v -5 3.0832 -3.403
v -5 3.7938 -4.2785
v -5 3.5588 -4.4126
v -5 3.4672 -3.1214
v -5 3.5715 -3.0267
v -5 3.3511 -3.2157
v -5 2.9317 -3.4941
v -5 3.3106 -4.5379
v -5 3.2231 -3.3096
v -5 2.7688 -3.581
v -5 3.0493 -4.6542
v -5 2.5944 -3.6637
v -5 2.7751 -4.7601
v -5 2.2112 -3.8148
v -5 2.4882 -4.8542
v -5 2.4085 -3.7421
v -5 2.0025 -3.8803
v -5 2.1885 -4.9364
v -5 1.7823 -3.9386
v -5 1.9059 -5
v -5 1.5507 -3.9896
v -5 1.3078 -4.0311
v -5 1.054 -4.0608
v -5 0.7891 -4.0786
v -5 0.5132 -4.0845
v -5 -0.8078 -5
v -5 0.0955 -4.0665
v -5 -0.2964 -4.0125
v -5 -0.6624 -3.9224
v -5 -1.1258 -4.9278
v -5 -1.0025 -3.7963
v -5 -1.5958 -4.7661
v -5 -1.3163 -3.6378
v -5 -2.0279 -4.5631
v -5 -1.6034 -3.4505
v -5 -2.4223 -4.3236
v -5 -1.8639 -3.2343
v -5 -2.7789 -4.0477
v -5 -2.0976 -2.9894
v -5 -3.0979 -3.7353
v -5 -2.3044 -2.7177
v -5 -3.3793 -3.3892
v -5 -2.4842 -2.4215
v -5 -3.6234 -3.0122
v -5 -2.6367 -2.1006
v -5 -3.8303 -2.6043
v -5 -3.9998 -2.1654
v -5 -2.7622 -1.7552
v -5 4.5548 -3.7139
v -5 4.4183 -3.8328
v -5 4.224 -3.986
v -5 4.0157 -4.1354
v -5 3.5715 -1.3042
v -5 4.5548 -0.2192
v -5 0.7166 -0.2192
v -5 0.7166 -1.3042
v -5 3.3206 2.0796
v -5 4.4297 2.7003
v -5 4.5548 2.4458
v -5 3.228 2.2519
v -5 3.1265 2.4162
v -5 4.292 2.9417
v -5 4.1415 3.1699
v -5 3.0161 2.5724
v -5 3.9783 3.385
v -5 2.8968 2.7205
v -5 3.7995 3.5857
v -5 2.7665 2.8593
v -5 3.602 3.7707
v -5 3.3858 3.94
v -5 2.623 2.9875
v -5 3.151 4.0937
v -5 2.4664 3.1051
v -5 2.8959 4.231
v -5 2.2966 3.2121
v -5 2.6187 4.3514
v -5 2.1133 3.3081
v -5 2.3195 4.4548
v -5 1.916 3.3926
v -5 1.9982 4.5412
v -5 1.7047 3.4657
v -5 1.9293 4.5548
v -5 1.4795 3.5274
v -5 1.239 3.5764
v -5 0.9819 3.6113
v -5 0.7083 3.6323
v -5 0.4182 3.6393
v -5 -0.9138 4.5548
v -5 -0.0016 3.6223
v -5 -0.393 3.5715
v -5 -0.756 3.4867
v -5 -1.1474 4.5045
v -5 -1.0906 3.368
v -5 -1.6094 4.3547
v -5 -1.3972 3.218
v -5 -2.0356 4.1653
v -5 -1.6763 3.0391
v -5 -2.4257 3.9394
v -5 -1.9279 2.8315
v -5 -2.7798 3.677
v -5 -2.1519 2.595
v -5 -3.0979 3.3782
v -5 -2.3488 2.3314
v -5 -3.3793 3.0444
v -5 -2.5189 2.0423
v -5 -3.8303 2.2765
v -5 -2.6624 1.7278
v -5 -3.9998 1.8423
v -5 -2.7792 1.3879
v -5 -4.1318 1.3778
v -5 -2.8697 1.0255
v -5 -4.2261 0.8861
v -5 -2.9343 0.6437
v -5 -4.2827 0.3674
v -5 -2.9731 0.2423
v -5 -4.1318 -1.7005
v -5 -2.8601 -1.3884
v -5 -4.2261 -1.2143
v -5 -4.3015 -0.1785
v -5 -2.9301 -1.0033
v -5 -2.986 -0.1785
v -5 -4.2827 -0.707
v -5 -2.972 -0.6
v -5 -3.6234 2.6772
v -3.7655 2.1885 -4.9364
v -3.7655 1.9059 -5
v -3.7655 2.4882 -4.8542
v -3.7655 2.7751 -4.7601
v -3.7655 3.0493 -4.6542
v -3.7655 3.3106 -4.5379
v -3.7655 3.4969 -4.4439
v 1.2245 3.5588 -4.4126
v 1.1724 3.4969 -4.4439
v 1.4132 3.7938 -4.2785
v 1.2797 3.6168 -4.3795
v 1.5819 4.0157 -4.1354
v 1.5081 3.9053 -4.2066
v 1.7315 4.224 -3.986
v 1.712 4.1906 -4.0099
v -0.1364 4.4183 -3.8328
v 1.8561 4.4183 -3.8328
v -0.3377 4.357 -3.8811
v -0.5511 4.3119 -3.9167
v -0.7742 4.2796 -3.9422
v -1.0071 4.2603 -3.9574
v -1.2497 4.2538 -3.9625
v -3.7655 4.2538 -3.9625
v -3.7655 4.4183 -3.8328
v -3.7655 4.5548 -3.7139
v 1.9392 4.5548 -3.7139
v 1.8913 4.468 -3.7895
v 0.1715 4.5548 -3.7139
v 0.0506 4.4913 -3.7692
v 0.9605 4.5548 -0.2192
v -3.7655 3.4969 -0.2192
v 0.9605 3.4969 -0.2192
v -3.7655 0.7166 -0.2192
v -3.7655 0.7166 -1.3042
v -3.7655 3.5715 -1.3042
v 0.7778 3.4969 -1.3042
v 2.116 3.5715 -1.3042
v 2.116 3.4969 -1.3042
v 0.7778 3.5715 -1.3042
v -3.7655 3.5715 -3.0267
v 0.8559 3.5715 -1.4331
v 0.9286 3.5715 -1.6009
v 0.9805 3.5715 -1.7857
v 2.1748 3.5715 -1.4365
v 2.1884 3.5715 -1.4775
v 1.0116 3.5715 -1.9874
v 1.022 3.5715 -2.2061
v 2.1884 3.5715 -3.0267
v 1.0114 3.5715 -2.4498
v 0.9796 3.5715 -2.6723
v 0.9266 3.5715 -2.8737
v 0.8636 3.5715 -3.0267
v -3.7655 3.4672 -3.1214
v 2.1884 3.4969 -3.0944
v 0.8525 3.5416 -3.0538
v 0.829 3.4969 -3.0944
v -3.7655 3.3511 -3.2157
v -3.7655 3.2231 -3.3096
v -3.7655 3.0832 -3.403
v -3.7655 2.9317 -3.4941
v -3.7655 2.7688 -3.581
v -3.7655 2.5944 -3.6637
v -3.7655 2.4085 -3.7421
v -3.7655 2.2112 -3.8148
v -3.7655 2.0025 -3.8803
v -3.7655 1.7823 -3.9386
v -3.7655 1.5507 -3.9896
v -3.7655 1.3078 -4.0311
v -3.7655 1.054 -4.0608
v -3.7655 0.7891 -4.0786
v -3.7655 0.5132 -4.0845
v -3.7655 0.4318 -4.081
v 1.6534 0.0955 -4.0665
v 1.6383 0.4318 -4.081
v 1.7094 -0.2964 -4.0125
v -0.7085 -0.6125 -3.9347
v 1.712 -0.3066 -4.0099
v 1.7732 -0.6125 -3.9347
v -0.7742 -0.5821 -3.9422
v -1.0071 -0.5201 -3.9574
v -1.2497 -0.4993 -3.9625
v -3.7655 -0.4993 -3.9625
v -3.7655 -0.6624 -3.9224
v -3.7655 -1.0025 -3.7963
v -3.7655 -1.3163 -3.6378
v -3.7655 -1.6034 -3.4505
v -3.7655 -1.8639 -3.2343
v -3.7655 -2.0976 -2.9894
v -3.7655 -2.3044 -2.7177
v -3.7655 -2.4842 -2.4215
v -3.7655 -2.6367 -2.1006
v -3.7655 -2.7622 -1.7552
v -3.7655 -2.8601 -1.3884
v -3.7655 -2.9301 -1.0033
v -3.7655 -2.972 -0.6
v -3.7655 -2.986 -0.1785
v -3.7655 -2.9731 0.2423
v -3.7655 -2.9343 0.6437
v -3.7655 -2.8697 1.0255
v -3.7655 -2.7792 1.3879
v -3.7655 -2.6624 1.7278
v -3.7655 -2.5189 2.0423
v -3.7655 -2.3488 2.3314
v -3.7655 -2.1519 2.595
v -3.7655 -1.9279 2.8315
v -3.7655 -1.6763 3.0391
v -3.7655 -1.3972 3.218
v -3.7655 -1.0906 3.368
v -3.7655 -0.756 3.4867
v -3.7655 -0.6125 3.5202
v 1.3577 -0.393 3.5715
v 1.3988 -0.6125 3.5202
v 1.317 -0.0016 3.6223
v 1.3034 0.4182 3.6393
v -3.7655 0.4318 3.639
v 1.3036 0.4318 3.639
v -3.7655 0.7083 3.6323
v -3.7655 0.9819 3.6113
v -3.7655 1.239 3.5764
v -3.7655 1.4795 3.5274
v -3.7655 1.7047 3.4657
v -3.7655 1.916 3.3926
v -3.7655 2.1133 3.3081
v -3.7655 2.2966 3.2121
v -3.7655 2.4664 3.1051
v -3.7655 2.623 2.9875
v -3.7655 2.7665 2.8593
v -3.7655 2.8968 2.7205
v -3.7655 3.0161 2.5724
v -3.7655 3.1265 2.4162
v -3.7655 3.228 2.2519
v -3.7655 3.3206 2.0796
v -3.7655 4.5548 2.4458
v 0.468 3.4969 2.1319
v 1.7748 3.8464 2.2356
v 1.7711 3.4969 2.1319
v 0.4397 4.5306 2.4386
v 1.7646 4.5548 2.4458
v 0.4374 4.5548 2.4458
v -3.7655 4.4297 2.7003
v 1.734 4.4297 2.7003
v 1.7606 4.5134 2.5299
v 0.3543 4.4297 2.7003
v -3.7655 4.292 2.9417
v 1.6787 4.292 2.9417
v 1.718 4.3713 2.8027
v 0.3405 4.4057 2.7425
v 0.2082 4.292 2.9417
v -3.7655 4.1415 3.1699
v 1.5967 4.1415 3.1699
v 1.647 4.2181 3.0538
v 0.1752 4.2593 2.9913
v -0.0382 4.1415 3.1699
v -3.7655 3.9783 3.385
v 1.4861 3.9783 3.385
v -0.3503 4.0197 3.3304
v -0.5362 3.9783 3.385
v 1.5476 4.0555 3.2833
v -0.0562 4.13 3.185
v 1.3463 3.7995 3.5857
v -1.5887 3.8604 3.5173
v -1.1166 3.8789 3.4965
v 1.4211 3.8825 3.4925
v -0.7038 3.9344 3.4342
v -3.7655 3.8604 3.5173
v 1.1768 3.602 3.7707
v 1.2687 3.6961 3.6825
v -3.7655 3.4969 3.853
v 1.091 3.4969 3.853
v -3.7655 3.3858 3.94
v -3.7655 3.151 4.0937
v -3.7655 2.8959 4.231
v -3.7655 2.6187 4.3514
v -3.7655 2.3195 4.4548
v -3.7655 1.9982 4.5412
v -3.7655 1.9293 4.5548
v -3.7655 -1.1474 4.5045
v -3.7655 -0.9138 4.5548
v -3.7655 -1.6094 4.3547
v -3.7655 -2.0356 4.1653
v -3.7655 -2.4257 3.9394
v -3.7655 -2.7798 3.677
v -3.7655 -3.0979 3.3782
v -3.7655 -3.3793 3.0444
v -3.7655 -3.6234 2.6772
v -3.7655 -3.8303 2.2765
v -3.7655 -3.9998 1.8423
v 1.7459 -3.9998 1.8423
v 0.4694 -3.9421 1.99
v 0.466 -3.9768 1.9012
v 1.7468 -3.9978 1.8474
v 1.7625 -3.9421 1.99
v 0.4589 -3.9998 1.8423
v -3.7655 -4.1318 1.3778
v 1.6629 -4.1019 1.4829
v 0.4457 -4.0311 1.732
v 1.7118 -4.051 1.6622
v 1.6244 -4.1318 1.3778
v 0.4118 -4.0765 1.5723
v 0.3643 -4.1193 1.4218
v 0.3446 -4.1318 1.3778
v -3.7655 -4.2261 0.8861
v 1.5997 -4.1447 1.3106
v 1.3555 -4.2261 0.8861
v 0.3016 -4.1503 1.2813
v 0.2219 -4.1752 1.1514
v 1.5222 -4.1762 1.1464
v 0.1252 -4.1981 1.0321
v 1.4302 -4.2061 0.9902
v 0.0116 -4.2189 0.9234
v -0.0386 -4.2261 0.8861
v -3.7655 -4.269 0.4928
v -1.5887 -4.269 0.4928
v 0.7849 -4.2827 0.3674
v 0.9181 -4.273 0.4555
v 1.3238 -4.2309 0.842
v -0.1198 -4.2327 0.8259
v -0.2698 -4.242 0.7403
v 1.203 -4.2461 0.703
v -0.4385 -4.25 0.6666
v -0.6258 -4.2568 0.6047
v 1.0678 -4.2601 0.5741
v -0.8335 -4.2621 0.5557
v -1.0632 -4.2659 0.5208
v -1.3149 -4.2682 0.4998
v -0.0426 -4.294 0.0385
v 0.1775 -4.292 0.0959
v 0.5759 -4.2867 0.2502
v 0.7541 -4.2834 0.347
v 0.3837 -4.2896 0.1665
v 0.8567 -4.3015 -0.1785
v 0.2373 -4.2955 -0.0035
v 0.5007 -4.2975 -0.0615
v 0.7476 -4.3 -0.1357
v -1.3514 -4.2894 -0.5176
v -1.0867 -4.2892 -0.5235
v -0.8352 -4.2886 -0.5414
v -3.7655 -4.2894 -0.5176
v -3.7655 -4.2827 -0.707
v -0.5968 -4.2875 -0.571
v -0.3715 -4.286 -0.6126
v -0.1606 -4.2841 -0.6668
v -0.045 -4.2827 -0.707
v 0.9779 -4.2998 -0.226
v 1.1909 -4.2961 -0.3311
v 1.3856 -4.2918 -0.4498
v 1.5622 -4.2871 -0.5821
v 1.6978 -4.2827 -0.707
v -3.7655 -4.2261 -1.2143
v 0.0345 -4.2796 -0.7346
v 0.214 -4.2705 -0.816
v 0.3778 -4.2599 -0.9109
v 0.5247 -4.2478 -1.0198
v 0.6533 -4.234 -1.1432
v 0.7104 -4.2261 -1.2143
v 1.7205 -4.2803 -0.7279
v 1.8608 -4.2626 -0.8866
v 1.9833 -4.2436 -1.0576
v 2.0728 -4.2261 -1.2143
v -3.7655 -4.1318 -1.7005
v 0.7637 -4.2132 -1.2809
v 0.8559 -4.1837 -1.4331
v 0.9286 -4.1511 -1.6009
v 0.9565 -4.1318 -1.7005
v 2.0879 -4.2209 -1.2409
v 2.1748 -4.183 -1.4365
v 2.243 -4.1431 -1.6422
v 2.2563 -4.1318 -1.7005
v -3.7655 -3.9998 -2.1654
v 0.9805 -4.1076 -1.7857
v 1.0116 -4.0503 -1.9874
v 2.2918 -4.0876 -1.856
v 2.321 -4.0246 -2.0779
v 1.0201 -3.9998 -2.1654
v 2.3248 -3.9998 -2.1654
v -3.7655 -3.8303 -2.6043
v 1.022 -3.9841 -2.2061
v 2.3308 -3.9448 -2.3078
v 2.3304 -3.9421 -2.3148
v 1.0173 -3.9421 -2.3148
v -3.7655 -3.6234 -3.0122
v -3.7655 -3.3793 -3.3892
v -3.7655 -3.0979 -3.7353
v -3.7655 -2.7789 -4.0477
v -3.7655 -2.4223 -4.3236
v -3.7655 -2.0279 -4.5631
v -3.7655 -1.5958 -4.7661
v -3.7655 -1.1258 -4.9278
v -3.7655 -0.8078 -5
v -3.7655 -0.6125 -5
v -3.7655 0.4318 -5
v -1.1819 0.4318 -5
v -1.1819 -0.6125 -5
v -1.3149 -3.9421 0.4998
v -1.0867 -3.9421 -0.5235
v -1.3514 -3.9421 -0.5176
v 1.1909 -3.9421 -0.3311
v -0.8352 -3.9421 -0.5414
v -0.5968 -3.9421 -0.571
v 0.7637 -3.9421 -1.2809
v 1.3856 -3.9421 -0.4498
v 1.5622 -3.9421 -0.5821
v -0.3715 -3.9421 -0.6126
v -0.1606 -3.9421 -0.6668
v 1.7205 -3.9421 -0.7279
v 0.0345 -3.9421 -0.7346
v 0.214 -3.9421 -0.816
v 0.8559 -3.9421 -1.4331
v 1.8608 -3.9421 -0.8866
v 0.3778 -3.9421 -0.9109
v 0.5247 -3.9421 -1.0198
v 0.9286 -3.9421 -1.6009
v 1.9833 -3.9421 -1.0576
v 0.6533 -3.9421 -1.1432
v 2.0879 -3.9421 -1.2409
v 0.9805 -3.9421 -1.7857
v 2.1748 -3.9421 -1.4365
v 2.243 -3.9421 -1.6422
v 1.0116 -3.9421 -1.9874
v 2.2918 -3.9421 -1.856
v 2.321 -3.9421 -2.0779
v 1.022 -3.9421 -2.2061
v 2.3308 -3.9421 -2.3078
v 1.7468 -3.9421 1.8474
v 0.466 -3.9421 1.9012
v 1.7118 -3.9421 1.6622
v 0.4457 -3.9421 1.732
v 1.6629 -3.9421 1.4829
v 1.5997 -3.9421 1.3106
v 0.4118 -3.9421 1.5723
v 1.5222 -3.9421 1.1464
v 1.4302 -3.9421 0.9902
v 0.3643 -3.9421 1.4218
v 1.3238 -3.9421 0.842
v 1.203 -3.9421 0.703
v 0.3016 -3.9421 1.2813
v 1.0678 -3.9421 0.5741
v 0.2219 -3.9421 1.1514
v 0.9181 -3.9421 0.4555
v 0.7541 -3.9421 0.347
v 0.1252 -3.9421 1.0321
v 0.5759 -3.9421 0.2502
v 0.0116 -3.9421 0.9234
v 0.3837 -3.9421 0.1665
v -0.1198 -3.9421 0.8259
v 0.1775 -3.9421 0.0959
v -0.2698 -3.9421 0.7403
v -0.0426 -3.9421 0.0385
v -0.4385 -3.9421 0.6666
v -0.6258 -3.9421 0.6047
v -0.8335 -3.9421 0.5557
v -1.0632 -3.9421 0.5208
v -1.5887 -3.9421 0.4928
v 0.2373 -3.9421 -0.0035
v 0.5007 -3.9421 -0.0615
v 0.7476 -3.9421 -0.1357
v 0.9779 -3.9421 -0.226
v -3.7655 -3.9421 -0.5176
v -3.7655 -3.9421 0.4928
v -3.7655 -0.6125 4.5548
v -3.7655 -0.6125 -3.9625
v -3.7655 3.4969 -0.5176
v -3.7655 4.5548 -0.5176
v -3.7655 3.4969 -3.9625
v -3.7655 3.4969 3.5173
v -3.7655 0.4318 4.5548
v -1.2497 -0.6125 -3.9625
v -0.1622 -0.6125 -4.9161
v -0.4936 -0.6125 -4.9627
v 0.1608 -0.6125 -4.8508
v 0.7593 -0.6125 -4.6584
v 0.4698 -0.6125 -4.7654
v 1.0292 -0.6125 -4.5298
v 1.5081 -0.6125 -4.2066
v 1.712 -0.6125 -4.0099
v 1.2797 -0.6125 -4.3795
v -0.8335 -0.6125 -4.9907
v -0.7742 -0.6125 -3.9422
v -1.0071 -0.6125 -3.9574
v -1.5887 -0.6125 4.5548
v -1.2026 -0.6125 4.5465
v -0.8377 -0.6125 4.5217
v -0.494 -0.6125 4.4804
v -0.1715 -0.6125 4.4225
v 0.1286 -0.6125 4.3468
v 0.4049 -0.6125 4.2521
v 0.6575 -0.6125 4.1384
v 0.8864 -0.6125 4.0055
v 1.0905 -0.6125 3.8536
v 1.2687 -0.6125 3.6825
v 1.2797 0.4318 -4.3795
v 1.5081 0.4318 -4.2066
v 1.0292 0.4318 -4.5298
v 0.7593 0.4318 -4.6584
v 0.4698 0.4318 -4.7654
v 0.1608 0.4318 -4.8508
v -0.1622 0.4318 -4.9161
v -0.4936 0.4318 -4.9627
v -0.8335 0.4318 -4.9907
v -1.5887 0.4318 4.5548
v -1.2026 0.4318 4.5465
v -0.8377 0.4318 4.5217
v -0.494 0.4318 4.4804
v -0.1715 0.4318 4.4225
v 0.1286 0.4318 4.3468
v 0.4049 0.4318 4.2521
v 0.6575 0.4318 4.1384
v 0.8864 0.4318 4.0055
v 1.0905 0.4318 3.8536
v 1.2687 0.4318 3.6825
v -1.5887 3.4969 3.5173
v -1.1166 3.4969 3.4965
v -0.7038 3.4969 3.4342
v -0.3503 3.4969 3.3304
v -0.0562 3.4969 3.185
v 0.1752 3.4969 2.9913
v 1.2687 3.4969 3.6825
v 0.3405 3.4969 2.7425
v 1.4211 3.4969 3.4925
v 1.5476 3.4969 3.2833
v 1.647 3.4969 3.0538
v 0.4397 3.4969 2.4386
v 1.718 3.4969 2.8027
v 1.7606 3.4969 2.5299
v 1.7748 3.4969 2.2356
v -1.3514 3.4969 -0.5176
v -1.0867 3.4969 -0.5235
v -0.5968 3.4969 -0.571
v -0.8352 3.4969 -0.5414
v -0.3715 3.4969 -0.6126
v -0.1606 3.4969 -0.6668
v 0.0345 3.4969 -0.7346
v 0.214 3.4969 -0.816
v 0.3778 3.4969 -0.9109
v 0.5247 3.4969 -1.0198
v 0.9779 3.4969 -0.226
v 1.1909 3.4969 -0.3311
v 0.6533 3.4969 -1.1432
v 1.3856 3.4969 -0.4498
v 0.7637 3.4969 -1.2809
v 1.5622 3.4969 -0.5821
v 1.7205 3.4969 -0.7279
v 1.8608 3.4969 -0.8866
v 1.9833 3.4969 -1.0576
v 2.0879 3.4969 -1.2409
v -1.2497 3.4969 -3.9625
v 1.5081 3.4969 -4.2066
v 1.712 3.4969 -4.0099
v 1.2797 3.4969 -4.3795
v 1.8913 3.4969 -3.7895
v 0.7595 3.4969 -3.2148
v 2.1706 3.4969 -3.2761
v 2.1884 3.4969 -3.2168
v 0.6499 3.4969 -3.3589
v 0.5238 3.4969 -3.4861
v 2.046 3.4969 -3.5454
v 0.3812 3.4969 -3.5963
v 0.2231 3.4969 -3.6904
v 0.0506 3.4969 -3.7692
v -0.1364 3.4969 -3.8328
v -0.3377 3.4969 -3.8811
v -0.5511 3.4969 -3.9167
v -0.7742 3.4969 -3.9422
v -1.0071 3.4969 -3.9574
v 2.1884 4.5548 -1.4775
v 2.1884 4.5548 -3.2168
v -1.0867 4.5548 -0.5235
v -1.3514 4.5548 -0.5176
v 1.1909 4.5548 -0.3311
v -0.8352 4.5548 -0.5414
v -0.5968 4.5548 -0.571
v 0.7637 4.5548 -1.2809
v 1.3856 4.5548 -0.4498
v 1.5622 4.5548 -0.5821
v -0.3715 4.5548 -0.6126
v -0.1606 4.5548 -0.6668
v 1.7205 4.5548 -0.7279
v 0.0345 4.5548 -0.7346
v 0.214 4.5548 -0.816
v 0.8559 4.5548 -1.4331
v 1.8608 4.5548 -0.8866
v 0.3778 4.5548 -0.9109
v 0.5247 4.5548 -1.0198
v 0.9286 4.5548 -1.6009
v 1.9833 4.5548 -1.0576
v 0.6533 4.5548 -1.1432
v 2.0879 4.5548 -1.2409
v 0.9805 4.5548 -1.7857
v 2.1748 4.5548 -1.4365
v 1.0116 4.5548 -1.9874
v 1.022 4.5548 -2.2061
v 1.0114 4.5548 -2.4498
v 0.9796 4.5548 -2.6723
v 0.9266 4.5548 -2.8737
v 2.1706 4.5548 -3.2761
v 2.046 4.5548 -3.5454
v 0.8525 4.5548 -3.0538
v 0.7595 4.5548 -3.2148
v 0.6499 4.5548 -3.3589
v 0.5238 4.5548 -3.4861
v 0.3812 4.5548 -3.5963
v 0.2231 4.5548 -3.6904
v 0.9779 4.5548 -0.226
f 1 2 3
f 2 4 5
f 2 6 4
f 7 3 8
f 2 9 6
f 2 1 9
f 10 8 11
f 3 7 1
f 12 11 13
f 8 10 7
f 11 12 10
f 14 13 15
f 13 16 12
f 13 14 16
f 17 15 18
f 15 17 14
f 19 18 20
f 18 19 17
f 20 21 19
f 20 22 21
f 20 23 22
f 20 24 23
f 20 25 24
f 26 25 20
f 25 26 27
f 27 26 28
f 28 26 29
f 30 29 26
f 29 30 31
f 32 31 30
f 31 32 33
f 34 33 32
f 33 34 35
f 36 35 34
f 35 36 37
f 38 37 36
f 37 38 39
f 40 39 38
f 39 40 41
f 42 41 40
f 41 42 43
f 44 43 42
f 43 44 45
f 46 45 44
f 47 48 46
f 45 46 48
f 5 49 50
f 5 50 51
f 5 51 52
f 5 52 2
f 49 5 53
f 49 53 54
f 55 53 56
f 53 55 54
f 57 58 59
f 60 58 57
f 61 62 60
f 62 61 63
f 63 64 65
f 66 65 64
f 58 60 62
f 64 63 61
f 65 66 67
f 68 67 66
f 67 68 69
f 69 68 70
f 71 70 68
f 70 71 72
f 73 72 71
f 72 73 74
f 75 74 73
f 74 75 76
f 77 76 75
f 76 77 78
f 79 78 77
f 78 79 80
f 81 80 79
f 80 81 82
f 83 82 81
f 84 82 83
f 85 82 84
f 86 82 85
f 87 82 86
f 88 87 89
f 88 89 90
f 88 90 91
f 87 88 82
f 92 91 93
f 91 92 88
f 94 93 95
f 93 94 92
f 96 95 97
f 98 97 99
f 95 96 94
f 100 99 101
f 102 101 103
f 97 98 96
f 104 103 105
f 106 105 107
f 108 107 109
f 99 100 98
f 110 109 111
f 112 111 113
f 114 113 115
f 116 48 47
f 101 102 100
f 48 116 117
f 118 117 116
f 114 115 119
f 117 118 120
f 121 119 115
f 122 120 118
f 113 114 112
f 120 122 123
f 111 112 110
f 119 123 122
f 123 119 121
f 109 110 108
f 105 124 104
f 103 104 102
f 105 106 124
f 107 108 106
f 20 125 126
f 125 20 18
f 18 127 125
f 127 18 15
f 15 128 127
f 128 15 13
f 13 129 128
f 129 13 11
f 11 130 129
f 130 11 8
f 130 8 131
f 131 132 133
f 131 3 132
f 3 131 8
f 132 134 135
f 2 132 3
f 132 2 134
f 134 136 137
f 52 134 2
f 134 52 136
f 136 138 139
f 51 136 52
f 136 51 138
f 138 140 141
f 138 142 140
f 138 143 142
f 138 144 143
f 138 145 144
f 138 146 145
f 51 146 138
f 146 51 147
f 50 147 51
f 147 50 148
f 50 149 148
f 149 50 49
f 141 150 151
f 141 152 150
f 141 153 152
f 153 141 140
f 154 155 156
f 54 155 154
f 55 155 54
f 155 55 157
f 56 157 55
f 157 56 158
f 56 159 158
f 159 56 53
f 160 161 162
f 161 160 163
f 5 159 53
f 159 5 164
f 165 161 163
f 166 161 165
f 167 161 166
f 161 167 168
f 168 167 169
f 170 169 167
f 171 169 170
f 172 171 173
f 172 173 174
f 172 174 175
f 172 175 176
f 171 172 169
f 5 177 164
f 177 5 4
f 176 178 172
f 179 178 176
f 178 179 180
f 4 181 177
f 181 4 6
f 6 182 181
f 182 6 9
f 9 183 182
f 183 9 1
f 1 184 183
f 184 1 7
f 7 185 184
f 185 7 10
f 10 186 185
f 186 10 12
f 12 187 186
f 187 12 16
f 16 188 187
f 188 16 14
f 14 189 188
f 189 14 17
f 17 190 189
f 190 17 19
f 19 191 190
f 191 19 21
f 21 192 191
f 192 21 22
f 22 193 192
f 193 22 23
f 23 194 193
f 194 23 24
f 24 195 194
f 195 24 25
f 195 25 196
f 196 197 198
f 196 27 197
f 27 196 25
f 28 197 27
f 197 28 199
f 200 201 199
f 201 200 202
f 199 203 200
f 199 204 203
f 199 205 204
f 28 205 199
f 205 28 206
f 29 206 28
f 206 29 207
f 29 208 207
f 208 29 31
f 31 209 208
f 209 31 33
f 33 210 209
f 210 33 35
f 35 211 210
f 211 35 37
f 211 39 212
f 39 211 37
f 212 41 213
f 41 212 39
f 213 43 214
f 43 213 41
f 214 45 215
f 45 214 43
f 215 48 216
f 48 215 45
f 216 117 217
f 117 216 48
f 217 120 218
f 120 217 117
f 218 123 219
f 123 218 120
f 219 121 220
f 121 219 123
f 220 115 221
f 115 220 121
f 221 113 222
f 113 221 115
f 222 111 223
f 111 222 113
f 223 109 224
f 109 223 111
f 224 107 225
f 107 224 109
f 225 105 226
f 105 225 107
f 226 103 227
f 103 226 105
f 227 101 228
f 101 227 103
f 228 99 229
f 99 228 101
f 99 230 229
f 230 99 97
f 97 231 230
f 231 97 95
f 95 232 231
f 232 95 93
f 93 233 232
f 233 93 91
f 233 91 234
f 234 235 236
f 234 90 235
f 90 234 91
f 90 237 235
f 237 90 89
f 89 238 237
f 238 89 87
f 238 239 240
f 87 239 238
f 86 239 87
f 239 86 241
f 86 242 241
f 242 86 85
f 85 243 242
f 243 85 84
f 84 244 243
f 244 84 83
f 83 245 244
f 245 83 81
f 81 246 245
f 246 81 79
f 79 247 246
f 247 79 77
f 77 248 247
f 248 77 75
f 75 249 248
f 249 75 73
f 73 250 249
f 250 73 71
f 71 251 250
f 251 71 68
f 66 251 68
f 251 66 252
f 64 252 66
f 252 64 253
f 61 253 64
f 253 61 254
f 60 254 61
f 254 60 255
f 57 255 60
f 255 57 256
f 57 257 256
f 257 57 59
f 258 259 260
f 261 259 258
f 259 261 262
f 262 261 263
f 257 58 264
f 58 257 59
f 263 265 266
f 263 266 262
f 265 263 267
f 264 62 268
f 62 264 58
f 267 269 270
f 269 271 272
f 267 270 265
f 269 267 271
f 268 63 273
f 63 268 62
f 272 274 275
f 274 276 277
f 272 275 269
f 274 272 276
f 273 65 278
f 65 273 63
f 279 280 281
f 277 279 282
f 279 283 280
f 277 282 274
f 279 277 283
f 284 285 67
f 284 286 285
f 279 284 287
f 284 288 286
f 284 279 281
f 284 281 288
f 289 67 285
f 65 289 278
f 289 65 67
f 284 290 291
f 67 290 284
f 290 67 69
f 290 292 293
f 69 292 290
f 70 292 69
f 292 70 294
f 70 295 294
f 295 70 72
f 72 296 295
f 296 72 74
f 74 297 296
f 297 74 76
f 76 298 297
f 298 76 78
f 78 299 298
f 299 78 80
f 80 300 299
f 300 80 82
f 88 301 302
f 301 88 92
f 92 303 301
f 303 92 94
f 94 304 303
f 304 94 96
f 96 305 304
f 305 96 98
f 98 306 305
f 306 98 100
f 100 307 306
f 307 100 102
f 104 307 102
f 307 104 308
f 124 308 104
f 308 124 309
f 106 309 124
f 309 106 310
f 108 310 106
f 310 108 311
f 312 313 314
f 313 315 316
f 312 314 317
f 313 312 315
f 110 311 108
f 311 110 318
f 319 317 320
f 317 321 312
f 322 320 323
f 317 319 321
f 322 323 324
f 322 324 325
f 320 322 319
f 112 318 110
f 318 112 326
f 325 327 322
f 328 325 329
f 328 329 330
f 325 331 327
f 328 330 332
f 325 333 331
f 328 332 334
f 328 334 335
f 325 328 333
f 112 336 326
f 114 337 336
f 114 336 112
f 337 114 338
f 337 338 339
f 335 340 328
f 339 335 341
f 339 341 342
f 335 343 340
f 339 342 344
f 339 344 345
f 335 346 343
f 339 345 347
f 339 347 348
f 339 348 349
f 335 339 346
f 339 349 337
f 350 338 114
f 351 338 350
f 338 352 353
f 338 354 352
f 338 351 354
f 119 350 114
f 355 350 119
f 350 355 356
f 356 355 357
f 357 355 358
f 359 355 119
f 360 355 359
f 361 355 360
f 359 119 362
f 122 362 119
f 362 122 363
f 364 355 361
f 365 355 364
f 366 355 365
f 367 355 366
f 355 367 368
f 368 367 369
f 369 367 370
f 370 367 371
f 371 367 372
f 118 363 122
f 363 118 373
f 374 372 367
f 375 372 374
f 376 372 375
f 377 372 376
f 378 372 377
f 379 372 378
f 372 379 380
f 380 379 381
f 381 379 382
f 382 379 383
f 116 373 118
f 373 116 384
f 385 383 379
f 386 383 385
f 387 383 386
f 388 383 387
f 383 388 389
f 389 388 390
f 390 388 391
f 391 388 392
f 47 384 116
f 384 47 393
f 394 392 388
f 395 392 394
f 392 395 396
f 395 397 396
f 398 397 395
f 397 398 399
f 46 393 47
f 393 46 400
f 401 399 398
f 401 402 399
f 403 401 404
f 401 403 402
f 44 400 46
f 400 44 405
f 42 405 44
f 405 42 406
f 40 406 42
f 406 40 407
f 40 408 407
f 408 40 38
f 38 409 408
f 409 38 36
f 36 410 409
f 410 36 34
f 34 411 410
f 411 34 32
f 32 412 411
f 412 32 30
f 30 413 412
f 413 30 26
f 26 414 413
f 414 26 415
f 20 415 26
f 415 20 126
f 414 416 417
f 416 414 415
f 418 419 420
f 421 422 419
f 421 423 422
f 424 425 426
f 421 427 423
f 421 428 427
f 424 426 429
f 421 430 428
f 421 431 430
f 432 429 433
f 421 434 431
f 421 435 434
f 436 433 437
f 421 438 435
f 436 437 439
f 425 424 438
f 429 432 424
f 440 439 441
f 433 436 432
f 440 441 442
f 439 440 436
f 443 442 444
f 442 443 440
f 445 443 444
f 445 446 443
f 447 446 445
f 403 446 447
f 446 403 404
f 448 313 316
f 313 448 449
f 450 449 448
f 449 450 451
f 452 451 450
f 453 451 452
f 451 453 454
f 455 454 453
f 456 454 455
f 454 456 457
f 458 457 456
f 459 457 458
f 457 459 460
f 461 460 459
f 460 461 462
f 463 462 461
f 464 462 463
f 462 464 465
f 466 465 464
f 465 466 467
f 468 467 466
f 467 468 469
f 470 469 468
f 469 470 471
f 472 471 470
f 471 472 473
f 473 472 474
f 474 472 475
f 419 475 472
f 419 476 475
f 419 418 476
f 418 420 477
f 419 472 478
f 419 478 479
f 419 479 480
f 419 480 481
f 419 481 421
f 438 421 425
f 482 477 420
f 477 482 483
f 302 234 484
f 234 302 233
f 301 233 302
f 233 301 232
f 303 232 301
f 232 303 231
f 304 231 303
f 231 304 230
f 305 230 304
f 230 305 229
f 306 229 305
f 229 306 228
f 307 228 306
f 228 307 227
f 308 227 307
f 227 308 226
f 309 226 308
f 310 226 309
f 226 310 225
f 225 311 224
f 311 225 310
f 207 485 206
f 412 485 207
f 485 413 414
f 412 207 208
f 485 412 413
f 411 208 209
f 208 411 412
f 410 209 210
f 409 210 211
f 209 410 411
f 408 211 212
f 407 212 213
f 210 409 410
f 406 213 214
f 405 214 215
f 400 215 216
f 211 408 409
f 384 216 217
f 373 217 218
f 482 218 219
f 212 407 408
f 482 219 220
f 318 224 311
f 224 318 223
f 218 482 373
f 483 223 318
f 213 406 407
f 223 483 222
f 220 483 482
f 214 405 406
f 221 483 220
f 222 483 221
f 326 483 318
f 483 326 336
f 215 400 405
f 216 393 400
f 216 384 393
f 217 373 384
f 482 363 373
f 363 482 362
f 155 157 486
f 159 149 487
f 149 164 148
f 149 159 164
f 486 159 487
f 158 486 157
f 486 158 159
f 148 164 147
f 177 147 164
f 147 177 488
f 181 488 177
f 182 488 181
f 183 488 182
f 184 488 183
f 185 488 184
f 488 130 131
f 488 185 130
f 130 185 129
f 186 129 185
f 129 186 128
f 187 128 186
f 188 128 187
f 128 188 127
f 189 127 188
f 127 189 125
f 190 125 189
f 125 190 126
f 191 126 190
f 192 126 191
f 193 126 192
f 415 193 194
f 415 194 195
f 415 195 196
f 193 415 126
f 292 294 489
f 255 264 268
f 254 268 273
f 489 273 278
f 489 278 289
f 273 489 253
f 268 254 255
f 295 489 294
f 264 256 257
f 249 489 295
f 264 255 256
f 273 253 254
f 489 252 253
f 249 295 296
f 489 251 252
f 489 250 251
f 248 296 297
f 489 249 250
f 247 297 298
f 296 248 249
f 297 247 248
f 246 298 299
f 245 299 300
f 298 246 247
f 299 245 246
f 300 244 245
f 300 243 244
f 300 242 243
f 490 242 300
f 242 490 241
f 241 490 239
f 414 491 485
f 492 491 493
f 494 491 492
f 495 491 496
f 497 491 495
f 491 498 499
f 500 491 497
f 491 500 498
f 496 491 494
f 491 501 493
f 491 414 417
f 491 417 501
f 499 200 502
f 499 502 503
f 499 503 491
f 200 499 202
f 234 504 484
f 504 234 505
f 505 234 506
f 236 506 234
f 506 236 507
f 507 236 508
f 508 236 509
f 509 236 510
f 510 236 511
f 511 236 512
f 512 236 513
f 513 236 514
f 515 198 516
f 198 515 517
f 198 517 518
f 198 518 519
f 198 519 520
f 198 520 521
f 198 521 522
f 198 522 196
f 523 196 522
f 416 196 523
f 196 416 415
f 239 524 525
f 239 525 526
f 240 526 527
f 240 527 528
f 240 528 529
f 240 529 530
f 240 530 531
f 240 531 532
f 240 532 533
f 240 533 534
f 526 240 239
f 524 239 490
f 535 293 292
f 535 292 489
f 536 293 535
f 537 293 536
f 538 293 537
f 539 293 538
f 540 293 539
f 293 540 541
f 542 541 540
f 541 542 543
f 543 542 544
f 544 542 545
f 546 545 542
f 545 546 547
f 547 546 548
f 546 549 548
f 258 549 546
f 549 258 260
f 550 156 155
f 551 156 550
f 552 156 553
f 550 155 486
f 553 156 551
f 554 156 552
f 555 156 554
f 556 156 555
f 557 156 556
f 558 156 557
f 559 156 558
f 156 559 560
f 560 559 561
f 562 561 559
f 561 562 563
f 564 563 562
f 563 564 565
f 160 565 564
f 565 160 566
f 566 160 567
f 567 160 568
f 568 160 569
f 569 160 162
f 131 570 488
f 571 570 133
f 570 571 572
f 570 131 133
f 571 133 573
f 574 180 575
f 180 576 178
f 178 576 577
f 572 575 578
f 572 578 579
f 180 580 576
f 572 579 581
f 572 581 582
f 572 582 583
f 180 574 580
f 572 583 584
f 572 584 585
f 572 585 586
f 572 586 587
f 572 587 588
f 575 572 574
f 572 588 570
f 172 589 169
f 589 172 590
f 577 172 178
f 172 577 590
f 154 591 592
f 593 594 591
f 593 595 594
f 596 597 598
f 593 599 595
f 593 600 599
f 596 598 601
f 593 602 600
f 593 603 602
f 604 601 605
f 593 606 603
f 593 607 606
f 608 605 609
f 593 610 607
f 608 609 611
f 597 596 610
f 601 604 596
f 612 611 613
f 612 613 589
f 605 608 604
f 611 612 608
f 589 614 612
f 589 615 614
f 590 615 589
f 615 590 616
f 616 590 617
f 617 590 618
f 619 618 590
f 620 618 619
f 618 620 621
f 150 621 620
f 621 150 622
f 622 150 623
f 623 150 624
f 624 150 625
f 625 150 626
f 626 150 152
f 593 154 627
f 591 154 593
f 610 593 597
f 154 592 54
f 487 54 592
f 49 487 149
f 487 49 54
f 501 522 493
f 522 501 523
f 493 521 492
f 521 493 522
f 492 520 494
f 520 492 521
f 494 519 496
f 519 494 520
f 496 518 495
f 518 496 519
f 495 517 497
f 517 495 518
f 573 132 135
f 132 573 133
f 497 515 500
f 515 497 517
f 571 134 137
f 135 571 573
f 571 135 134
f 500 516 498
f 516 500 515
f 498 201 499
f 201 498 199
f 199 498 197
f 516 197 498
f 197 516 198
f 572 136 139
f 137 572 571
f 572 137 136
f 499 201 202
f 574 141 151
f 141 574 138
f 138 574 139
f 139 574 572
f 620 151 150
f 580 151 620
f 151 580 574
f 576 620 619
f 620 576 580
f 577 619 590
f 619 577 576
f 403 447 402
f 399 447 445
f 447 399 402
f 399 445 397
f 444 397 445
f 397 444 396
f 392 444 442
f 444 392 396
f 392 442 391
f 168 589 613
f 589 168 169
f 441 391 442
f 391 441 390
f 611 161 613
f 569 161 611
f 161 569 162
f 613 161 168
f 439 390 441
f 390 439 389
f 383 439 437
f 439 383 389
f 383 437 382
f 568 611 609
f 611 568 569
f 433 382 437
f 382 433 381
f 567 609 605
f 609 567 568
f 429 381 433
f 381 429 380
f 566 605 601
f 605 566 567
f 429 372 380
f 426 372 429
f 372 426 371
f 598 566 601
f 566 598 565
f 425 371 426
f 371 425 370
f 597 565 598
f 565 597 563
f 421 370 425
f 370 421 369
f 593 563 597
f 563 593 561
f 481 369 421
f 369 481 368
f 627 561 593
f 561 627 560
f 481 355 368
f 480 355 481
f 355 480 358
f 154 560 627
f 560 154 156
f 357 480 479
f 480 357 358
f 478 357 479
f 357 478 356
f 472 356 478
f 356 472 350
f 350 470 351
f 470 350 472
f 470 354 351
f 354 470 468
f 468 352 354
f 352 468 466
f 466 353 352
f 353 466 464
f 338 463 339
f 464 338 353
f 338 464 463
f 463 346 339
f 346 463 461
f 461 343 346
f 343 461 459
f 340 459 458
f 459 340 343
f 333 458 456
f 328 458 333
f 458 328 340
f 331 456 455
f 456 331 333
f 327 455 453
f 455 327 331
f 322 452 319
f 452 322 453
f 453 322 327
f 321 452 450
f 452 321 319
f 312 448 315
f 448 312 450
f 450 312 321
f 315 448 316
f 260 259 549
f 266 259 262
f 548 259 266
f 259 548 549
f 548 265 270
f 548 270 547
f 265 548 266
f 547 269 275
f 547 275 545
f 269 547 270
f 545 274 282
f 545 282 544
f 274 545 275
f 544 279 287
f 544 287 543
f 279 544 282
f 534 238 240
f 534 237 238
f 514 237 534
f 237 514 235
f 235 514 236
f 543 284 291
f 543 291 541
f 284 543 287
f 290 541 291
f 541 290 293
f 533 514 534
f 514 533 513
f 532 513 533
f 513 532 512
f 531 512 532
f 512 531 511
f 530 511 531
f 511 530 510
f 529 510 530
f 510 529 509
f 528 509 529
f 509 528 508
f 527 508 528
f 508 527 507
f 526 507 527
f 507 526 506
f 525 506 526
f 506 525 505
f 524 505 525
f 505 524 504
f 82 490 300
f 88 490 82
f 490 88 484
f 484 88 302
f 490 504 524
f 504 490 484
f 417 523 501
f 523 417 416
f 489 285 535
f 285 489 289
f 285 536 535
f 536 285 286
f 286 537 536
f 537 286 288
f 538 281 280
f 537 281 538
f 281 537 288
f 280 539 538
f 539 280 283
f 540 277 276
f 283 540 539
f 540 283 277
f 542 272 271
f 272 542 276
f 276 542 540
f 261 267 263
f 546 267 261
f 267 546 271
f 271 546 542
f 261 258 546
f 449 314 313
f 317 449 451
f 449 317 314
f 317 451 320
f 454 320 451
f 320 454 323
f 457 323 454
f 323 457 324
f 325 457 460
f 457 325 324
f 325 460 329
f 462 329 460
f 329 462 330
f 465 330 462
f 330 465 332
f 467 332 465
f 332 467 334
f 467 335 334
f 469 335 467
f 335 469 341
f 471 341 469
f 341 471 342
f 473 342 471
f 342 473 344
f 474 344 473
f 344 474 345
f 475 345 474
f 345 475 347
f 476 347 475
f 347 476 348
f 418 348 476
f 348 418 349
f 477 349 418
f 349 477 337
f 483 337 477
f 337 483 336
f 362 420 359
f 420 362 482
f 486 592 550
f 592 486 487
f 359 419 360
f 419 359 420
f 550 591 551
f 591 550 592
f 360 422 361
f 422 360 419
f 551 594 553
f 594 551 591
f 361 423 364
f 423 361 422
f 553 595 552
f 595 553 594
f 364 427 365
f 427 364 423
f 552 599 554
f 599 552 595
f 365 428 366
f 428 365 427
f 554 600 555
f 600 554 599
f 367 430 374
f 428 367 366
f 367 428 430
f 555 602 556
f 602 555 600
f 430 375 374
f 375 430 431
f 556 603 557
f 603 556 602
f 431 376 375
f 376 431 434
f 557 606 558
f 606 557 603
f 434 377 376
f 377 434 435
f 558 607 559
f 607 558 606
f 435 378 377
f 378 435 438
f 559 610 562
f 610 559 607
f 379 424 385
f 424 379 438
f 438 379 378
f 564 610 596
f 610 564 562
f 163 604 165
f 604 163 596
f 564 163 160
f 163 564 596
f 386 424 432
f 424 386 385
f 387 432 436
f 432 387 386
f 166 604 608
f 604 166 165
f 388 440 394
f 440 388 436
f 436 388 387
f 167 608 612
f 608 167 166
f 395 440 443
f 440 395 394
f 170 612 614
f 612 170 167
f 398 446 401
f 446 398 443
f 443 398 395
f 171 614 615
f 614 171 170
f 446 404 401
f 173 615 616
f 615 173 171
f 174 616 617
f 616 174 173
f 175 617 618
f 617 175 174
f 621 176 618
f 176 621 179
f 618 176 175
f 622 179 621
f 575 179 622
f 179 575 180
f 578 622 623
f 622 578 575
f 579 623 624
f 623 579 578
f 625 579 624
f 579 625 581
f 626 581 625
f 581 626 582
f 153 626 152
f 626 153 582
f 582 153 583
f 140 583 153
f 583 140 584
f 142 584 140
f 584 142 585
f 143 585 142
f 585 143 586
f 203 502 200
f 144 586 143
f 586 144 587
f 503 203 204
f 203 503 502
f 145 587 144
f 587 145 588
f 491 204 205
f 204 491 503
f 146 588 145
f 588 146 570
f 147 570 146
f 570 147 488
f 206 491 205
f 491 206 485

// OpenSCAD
translate([-5,-5,5])rotate([90,90,90])intersection(){
    linear_extrude(7.4)translate([10,0,0])rotate(90)text("G");
translate([10,0,-1.2])rotate(-90,[0,1,0])linear_extrude(11){text("E");};
translate([0,10,-1.2])rotate(90,[1,0,0])translate([10,0,0])rotate(90)linear_extrude(11){text("B");};
};
